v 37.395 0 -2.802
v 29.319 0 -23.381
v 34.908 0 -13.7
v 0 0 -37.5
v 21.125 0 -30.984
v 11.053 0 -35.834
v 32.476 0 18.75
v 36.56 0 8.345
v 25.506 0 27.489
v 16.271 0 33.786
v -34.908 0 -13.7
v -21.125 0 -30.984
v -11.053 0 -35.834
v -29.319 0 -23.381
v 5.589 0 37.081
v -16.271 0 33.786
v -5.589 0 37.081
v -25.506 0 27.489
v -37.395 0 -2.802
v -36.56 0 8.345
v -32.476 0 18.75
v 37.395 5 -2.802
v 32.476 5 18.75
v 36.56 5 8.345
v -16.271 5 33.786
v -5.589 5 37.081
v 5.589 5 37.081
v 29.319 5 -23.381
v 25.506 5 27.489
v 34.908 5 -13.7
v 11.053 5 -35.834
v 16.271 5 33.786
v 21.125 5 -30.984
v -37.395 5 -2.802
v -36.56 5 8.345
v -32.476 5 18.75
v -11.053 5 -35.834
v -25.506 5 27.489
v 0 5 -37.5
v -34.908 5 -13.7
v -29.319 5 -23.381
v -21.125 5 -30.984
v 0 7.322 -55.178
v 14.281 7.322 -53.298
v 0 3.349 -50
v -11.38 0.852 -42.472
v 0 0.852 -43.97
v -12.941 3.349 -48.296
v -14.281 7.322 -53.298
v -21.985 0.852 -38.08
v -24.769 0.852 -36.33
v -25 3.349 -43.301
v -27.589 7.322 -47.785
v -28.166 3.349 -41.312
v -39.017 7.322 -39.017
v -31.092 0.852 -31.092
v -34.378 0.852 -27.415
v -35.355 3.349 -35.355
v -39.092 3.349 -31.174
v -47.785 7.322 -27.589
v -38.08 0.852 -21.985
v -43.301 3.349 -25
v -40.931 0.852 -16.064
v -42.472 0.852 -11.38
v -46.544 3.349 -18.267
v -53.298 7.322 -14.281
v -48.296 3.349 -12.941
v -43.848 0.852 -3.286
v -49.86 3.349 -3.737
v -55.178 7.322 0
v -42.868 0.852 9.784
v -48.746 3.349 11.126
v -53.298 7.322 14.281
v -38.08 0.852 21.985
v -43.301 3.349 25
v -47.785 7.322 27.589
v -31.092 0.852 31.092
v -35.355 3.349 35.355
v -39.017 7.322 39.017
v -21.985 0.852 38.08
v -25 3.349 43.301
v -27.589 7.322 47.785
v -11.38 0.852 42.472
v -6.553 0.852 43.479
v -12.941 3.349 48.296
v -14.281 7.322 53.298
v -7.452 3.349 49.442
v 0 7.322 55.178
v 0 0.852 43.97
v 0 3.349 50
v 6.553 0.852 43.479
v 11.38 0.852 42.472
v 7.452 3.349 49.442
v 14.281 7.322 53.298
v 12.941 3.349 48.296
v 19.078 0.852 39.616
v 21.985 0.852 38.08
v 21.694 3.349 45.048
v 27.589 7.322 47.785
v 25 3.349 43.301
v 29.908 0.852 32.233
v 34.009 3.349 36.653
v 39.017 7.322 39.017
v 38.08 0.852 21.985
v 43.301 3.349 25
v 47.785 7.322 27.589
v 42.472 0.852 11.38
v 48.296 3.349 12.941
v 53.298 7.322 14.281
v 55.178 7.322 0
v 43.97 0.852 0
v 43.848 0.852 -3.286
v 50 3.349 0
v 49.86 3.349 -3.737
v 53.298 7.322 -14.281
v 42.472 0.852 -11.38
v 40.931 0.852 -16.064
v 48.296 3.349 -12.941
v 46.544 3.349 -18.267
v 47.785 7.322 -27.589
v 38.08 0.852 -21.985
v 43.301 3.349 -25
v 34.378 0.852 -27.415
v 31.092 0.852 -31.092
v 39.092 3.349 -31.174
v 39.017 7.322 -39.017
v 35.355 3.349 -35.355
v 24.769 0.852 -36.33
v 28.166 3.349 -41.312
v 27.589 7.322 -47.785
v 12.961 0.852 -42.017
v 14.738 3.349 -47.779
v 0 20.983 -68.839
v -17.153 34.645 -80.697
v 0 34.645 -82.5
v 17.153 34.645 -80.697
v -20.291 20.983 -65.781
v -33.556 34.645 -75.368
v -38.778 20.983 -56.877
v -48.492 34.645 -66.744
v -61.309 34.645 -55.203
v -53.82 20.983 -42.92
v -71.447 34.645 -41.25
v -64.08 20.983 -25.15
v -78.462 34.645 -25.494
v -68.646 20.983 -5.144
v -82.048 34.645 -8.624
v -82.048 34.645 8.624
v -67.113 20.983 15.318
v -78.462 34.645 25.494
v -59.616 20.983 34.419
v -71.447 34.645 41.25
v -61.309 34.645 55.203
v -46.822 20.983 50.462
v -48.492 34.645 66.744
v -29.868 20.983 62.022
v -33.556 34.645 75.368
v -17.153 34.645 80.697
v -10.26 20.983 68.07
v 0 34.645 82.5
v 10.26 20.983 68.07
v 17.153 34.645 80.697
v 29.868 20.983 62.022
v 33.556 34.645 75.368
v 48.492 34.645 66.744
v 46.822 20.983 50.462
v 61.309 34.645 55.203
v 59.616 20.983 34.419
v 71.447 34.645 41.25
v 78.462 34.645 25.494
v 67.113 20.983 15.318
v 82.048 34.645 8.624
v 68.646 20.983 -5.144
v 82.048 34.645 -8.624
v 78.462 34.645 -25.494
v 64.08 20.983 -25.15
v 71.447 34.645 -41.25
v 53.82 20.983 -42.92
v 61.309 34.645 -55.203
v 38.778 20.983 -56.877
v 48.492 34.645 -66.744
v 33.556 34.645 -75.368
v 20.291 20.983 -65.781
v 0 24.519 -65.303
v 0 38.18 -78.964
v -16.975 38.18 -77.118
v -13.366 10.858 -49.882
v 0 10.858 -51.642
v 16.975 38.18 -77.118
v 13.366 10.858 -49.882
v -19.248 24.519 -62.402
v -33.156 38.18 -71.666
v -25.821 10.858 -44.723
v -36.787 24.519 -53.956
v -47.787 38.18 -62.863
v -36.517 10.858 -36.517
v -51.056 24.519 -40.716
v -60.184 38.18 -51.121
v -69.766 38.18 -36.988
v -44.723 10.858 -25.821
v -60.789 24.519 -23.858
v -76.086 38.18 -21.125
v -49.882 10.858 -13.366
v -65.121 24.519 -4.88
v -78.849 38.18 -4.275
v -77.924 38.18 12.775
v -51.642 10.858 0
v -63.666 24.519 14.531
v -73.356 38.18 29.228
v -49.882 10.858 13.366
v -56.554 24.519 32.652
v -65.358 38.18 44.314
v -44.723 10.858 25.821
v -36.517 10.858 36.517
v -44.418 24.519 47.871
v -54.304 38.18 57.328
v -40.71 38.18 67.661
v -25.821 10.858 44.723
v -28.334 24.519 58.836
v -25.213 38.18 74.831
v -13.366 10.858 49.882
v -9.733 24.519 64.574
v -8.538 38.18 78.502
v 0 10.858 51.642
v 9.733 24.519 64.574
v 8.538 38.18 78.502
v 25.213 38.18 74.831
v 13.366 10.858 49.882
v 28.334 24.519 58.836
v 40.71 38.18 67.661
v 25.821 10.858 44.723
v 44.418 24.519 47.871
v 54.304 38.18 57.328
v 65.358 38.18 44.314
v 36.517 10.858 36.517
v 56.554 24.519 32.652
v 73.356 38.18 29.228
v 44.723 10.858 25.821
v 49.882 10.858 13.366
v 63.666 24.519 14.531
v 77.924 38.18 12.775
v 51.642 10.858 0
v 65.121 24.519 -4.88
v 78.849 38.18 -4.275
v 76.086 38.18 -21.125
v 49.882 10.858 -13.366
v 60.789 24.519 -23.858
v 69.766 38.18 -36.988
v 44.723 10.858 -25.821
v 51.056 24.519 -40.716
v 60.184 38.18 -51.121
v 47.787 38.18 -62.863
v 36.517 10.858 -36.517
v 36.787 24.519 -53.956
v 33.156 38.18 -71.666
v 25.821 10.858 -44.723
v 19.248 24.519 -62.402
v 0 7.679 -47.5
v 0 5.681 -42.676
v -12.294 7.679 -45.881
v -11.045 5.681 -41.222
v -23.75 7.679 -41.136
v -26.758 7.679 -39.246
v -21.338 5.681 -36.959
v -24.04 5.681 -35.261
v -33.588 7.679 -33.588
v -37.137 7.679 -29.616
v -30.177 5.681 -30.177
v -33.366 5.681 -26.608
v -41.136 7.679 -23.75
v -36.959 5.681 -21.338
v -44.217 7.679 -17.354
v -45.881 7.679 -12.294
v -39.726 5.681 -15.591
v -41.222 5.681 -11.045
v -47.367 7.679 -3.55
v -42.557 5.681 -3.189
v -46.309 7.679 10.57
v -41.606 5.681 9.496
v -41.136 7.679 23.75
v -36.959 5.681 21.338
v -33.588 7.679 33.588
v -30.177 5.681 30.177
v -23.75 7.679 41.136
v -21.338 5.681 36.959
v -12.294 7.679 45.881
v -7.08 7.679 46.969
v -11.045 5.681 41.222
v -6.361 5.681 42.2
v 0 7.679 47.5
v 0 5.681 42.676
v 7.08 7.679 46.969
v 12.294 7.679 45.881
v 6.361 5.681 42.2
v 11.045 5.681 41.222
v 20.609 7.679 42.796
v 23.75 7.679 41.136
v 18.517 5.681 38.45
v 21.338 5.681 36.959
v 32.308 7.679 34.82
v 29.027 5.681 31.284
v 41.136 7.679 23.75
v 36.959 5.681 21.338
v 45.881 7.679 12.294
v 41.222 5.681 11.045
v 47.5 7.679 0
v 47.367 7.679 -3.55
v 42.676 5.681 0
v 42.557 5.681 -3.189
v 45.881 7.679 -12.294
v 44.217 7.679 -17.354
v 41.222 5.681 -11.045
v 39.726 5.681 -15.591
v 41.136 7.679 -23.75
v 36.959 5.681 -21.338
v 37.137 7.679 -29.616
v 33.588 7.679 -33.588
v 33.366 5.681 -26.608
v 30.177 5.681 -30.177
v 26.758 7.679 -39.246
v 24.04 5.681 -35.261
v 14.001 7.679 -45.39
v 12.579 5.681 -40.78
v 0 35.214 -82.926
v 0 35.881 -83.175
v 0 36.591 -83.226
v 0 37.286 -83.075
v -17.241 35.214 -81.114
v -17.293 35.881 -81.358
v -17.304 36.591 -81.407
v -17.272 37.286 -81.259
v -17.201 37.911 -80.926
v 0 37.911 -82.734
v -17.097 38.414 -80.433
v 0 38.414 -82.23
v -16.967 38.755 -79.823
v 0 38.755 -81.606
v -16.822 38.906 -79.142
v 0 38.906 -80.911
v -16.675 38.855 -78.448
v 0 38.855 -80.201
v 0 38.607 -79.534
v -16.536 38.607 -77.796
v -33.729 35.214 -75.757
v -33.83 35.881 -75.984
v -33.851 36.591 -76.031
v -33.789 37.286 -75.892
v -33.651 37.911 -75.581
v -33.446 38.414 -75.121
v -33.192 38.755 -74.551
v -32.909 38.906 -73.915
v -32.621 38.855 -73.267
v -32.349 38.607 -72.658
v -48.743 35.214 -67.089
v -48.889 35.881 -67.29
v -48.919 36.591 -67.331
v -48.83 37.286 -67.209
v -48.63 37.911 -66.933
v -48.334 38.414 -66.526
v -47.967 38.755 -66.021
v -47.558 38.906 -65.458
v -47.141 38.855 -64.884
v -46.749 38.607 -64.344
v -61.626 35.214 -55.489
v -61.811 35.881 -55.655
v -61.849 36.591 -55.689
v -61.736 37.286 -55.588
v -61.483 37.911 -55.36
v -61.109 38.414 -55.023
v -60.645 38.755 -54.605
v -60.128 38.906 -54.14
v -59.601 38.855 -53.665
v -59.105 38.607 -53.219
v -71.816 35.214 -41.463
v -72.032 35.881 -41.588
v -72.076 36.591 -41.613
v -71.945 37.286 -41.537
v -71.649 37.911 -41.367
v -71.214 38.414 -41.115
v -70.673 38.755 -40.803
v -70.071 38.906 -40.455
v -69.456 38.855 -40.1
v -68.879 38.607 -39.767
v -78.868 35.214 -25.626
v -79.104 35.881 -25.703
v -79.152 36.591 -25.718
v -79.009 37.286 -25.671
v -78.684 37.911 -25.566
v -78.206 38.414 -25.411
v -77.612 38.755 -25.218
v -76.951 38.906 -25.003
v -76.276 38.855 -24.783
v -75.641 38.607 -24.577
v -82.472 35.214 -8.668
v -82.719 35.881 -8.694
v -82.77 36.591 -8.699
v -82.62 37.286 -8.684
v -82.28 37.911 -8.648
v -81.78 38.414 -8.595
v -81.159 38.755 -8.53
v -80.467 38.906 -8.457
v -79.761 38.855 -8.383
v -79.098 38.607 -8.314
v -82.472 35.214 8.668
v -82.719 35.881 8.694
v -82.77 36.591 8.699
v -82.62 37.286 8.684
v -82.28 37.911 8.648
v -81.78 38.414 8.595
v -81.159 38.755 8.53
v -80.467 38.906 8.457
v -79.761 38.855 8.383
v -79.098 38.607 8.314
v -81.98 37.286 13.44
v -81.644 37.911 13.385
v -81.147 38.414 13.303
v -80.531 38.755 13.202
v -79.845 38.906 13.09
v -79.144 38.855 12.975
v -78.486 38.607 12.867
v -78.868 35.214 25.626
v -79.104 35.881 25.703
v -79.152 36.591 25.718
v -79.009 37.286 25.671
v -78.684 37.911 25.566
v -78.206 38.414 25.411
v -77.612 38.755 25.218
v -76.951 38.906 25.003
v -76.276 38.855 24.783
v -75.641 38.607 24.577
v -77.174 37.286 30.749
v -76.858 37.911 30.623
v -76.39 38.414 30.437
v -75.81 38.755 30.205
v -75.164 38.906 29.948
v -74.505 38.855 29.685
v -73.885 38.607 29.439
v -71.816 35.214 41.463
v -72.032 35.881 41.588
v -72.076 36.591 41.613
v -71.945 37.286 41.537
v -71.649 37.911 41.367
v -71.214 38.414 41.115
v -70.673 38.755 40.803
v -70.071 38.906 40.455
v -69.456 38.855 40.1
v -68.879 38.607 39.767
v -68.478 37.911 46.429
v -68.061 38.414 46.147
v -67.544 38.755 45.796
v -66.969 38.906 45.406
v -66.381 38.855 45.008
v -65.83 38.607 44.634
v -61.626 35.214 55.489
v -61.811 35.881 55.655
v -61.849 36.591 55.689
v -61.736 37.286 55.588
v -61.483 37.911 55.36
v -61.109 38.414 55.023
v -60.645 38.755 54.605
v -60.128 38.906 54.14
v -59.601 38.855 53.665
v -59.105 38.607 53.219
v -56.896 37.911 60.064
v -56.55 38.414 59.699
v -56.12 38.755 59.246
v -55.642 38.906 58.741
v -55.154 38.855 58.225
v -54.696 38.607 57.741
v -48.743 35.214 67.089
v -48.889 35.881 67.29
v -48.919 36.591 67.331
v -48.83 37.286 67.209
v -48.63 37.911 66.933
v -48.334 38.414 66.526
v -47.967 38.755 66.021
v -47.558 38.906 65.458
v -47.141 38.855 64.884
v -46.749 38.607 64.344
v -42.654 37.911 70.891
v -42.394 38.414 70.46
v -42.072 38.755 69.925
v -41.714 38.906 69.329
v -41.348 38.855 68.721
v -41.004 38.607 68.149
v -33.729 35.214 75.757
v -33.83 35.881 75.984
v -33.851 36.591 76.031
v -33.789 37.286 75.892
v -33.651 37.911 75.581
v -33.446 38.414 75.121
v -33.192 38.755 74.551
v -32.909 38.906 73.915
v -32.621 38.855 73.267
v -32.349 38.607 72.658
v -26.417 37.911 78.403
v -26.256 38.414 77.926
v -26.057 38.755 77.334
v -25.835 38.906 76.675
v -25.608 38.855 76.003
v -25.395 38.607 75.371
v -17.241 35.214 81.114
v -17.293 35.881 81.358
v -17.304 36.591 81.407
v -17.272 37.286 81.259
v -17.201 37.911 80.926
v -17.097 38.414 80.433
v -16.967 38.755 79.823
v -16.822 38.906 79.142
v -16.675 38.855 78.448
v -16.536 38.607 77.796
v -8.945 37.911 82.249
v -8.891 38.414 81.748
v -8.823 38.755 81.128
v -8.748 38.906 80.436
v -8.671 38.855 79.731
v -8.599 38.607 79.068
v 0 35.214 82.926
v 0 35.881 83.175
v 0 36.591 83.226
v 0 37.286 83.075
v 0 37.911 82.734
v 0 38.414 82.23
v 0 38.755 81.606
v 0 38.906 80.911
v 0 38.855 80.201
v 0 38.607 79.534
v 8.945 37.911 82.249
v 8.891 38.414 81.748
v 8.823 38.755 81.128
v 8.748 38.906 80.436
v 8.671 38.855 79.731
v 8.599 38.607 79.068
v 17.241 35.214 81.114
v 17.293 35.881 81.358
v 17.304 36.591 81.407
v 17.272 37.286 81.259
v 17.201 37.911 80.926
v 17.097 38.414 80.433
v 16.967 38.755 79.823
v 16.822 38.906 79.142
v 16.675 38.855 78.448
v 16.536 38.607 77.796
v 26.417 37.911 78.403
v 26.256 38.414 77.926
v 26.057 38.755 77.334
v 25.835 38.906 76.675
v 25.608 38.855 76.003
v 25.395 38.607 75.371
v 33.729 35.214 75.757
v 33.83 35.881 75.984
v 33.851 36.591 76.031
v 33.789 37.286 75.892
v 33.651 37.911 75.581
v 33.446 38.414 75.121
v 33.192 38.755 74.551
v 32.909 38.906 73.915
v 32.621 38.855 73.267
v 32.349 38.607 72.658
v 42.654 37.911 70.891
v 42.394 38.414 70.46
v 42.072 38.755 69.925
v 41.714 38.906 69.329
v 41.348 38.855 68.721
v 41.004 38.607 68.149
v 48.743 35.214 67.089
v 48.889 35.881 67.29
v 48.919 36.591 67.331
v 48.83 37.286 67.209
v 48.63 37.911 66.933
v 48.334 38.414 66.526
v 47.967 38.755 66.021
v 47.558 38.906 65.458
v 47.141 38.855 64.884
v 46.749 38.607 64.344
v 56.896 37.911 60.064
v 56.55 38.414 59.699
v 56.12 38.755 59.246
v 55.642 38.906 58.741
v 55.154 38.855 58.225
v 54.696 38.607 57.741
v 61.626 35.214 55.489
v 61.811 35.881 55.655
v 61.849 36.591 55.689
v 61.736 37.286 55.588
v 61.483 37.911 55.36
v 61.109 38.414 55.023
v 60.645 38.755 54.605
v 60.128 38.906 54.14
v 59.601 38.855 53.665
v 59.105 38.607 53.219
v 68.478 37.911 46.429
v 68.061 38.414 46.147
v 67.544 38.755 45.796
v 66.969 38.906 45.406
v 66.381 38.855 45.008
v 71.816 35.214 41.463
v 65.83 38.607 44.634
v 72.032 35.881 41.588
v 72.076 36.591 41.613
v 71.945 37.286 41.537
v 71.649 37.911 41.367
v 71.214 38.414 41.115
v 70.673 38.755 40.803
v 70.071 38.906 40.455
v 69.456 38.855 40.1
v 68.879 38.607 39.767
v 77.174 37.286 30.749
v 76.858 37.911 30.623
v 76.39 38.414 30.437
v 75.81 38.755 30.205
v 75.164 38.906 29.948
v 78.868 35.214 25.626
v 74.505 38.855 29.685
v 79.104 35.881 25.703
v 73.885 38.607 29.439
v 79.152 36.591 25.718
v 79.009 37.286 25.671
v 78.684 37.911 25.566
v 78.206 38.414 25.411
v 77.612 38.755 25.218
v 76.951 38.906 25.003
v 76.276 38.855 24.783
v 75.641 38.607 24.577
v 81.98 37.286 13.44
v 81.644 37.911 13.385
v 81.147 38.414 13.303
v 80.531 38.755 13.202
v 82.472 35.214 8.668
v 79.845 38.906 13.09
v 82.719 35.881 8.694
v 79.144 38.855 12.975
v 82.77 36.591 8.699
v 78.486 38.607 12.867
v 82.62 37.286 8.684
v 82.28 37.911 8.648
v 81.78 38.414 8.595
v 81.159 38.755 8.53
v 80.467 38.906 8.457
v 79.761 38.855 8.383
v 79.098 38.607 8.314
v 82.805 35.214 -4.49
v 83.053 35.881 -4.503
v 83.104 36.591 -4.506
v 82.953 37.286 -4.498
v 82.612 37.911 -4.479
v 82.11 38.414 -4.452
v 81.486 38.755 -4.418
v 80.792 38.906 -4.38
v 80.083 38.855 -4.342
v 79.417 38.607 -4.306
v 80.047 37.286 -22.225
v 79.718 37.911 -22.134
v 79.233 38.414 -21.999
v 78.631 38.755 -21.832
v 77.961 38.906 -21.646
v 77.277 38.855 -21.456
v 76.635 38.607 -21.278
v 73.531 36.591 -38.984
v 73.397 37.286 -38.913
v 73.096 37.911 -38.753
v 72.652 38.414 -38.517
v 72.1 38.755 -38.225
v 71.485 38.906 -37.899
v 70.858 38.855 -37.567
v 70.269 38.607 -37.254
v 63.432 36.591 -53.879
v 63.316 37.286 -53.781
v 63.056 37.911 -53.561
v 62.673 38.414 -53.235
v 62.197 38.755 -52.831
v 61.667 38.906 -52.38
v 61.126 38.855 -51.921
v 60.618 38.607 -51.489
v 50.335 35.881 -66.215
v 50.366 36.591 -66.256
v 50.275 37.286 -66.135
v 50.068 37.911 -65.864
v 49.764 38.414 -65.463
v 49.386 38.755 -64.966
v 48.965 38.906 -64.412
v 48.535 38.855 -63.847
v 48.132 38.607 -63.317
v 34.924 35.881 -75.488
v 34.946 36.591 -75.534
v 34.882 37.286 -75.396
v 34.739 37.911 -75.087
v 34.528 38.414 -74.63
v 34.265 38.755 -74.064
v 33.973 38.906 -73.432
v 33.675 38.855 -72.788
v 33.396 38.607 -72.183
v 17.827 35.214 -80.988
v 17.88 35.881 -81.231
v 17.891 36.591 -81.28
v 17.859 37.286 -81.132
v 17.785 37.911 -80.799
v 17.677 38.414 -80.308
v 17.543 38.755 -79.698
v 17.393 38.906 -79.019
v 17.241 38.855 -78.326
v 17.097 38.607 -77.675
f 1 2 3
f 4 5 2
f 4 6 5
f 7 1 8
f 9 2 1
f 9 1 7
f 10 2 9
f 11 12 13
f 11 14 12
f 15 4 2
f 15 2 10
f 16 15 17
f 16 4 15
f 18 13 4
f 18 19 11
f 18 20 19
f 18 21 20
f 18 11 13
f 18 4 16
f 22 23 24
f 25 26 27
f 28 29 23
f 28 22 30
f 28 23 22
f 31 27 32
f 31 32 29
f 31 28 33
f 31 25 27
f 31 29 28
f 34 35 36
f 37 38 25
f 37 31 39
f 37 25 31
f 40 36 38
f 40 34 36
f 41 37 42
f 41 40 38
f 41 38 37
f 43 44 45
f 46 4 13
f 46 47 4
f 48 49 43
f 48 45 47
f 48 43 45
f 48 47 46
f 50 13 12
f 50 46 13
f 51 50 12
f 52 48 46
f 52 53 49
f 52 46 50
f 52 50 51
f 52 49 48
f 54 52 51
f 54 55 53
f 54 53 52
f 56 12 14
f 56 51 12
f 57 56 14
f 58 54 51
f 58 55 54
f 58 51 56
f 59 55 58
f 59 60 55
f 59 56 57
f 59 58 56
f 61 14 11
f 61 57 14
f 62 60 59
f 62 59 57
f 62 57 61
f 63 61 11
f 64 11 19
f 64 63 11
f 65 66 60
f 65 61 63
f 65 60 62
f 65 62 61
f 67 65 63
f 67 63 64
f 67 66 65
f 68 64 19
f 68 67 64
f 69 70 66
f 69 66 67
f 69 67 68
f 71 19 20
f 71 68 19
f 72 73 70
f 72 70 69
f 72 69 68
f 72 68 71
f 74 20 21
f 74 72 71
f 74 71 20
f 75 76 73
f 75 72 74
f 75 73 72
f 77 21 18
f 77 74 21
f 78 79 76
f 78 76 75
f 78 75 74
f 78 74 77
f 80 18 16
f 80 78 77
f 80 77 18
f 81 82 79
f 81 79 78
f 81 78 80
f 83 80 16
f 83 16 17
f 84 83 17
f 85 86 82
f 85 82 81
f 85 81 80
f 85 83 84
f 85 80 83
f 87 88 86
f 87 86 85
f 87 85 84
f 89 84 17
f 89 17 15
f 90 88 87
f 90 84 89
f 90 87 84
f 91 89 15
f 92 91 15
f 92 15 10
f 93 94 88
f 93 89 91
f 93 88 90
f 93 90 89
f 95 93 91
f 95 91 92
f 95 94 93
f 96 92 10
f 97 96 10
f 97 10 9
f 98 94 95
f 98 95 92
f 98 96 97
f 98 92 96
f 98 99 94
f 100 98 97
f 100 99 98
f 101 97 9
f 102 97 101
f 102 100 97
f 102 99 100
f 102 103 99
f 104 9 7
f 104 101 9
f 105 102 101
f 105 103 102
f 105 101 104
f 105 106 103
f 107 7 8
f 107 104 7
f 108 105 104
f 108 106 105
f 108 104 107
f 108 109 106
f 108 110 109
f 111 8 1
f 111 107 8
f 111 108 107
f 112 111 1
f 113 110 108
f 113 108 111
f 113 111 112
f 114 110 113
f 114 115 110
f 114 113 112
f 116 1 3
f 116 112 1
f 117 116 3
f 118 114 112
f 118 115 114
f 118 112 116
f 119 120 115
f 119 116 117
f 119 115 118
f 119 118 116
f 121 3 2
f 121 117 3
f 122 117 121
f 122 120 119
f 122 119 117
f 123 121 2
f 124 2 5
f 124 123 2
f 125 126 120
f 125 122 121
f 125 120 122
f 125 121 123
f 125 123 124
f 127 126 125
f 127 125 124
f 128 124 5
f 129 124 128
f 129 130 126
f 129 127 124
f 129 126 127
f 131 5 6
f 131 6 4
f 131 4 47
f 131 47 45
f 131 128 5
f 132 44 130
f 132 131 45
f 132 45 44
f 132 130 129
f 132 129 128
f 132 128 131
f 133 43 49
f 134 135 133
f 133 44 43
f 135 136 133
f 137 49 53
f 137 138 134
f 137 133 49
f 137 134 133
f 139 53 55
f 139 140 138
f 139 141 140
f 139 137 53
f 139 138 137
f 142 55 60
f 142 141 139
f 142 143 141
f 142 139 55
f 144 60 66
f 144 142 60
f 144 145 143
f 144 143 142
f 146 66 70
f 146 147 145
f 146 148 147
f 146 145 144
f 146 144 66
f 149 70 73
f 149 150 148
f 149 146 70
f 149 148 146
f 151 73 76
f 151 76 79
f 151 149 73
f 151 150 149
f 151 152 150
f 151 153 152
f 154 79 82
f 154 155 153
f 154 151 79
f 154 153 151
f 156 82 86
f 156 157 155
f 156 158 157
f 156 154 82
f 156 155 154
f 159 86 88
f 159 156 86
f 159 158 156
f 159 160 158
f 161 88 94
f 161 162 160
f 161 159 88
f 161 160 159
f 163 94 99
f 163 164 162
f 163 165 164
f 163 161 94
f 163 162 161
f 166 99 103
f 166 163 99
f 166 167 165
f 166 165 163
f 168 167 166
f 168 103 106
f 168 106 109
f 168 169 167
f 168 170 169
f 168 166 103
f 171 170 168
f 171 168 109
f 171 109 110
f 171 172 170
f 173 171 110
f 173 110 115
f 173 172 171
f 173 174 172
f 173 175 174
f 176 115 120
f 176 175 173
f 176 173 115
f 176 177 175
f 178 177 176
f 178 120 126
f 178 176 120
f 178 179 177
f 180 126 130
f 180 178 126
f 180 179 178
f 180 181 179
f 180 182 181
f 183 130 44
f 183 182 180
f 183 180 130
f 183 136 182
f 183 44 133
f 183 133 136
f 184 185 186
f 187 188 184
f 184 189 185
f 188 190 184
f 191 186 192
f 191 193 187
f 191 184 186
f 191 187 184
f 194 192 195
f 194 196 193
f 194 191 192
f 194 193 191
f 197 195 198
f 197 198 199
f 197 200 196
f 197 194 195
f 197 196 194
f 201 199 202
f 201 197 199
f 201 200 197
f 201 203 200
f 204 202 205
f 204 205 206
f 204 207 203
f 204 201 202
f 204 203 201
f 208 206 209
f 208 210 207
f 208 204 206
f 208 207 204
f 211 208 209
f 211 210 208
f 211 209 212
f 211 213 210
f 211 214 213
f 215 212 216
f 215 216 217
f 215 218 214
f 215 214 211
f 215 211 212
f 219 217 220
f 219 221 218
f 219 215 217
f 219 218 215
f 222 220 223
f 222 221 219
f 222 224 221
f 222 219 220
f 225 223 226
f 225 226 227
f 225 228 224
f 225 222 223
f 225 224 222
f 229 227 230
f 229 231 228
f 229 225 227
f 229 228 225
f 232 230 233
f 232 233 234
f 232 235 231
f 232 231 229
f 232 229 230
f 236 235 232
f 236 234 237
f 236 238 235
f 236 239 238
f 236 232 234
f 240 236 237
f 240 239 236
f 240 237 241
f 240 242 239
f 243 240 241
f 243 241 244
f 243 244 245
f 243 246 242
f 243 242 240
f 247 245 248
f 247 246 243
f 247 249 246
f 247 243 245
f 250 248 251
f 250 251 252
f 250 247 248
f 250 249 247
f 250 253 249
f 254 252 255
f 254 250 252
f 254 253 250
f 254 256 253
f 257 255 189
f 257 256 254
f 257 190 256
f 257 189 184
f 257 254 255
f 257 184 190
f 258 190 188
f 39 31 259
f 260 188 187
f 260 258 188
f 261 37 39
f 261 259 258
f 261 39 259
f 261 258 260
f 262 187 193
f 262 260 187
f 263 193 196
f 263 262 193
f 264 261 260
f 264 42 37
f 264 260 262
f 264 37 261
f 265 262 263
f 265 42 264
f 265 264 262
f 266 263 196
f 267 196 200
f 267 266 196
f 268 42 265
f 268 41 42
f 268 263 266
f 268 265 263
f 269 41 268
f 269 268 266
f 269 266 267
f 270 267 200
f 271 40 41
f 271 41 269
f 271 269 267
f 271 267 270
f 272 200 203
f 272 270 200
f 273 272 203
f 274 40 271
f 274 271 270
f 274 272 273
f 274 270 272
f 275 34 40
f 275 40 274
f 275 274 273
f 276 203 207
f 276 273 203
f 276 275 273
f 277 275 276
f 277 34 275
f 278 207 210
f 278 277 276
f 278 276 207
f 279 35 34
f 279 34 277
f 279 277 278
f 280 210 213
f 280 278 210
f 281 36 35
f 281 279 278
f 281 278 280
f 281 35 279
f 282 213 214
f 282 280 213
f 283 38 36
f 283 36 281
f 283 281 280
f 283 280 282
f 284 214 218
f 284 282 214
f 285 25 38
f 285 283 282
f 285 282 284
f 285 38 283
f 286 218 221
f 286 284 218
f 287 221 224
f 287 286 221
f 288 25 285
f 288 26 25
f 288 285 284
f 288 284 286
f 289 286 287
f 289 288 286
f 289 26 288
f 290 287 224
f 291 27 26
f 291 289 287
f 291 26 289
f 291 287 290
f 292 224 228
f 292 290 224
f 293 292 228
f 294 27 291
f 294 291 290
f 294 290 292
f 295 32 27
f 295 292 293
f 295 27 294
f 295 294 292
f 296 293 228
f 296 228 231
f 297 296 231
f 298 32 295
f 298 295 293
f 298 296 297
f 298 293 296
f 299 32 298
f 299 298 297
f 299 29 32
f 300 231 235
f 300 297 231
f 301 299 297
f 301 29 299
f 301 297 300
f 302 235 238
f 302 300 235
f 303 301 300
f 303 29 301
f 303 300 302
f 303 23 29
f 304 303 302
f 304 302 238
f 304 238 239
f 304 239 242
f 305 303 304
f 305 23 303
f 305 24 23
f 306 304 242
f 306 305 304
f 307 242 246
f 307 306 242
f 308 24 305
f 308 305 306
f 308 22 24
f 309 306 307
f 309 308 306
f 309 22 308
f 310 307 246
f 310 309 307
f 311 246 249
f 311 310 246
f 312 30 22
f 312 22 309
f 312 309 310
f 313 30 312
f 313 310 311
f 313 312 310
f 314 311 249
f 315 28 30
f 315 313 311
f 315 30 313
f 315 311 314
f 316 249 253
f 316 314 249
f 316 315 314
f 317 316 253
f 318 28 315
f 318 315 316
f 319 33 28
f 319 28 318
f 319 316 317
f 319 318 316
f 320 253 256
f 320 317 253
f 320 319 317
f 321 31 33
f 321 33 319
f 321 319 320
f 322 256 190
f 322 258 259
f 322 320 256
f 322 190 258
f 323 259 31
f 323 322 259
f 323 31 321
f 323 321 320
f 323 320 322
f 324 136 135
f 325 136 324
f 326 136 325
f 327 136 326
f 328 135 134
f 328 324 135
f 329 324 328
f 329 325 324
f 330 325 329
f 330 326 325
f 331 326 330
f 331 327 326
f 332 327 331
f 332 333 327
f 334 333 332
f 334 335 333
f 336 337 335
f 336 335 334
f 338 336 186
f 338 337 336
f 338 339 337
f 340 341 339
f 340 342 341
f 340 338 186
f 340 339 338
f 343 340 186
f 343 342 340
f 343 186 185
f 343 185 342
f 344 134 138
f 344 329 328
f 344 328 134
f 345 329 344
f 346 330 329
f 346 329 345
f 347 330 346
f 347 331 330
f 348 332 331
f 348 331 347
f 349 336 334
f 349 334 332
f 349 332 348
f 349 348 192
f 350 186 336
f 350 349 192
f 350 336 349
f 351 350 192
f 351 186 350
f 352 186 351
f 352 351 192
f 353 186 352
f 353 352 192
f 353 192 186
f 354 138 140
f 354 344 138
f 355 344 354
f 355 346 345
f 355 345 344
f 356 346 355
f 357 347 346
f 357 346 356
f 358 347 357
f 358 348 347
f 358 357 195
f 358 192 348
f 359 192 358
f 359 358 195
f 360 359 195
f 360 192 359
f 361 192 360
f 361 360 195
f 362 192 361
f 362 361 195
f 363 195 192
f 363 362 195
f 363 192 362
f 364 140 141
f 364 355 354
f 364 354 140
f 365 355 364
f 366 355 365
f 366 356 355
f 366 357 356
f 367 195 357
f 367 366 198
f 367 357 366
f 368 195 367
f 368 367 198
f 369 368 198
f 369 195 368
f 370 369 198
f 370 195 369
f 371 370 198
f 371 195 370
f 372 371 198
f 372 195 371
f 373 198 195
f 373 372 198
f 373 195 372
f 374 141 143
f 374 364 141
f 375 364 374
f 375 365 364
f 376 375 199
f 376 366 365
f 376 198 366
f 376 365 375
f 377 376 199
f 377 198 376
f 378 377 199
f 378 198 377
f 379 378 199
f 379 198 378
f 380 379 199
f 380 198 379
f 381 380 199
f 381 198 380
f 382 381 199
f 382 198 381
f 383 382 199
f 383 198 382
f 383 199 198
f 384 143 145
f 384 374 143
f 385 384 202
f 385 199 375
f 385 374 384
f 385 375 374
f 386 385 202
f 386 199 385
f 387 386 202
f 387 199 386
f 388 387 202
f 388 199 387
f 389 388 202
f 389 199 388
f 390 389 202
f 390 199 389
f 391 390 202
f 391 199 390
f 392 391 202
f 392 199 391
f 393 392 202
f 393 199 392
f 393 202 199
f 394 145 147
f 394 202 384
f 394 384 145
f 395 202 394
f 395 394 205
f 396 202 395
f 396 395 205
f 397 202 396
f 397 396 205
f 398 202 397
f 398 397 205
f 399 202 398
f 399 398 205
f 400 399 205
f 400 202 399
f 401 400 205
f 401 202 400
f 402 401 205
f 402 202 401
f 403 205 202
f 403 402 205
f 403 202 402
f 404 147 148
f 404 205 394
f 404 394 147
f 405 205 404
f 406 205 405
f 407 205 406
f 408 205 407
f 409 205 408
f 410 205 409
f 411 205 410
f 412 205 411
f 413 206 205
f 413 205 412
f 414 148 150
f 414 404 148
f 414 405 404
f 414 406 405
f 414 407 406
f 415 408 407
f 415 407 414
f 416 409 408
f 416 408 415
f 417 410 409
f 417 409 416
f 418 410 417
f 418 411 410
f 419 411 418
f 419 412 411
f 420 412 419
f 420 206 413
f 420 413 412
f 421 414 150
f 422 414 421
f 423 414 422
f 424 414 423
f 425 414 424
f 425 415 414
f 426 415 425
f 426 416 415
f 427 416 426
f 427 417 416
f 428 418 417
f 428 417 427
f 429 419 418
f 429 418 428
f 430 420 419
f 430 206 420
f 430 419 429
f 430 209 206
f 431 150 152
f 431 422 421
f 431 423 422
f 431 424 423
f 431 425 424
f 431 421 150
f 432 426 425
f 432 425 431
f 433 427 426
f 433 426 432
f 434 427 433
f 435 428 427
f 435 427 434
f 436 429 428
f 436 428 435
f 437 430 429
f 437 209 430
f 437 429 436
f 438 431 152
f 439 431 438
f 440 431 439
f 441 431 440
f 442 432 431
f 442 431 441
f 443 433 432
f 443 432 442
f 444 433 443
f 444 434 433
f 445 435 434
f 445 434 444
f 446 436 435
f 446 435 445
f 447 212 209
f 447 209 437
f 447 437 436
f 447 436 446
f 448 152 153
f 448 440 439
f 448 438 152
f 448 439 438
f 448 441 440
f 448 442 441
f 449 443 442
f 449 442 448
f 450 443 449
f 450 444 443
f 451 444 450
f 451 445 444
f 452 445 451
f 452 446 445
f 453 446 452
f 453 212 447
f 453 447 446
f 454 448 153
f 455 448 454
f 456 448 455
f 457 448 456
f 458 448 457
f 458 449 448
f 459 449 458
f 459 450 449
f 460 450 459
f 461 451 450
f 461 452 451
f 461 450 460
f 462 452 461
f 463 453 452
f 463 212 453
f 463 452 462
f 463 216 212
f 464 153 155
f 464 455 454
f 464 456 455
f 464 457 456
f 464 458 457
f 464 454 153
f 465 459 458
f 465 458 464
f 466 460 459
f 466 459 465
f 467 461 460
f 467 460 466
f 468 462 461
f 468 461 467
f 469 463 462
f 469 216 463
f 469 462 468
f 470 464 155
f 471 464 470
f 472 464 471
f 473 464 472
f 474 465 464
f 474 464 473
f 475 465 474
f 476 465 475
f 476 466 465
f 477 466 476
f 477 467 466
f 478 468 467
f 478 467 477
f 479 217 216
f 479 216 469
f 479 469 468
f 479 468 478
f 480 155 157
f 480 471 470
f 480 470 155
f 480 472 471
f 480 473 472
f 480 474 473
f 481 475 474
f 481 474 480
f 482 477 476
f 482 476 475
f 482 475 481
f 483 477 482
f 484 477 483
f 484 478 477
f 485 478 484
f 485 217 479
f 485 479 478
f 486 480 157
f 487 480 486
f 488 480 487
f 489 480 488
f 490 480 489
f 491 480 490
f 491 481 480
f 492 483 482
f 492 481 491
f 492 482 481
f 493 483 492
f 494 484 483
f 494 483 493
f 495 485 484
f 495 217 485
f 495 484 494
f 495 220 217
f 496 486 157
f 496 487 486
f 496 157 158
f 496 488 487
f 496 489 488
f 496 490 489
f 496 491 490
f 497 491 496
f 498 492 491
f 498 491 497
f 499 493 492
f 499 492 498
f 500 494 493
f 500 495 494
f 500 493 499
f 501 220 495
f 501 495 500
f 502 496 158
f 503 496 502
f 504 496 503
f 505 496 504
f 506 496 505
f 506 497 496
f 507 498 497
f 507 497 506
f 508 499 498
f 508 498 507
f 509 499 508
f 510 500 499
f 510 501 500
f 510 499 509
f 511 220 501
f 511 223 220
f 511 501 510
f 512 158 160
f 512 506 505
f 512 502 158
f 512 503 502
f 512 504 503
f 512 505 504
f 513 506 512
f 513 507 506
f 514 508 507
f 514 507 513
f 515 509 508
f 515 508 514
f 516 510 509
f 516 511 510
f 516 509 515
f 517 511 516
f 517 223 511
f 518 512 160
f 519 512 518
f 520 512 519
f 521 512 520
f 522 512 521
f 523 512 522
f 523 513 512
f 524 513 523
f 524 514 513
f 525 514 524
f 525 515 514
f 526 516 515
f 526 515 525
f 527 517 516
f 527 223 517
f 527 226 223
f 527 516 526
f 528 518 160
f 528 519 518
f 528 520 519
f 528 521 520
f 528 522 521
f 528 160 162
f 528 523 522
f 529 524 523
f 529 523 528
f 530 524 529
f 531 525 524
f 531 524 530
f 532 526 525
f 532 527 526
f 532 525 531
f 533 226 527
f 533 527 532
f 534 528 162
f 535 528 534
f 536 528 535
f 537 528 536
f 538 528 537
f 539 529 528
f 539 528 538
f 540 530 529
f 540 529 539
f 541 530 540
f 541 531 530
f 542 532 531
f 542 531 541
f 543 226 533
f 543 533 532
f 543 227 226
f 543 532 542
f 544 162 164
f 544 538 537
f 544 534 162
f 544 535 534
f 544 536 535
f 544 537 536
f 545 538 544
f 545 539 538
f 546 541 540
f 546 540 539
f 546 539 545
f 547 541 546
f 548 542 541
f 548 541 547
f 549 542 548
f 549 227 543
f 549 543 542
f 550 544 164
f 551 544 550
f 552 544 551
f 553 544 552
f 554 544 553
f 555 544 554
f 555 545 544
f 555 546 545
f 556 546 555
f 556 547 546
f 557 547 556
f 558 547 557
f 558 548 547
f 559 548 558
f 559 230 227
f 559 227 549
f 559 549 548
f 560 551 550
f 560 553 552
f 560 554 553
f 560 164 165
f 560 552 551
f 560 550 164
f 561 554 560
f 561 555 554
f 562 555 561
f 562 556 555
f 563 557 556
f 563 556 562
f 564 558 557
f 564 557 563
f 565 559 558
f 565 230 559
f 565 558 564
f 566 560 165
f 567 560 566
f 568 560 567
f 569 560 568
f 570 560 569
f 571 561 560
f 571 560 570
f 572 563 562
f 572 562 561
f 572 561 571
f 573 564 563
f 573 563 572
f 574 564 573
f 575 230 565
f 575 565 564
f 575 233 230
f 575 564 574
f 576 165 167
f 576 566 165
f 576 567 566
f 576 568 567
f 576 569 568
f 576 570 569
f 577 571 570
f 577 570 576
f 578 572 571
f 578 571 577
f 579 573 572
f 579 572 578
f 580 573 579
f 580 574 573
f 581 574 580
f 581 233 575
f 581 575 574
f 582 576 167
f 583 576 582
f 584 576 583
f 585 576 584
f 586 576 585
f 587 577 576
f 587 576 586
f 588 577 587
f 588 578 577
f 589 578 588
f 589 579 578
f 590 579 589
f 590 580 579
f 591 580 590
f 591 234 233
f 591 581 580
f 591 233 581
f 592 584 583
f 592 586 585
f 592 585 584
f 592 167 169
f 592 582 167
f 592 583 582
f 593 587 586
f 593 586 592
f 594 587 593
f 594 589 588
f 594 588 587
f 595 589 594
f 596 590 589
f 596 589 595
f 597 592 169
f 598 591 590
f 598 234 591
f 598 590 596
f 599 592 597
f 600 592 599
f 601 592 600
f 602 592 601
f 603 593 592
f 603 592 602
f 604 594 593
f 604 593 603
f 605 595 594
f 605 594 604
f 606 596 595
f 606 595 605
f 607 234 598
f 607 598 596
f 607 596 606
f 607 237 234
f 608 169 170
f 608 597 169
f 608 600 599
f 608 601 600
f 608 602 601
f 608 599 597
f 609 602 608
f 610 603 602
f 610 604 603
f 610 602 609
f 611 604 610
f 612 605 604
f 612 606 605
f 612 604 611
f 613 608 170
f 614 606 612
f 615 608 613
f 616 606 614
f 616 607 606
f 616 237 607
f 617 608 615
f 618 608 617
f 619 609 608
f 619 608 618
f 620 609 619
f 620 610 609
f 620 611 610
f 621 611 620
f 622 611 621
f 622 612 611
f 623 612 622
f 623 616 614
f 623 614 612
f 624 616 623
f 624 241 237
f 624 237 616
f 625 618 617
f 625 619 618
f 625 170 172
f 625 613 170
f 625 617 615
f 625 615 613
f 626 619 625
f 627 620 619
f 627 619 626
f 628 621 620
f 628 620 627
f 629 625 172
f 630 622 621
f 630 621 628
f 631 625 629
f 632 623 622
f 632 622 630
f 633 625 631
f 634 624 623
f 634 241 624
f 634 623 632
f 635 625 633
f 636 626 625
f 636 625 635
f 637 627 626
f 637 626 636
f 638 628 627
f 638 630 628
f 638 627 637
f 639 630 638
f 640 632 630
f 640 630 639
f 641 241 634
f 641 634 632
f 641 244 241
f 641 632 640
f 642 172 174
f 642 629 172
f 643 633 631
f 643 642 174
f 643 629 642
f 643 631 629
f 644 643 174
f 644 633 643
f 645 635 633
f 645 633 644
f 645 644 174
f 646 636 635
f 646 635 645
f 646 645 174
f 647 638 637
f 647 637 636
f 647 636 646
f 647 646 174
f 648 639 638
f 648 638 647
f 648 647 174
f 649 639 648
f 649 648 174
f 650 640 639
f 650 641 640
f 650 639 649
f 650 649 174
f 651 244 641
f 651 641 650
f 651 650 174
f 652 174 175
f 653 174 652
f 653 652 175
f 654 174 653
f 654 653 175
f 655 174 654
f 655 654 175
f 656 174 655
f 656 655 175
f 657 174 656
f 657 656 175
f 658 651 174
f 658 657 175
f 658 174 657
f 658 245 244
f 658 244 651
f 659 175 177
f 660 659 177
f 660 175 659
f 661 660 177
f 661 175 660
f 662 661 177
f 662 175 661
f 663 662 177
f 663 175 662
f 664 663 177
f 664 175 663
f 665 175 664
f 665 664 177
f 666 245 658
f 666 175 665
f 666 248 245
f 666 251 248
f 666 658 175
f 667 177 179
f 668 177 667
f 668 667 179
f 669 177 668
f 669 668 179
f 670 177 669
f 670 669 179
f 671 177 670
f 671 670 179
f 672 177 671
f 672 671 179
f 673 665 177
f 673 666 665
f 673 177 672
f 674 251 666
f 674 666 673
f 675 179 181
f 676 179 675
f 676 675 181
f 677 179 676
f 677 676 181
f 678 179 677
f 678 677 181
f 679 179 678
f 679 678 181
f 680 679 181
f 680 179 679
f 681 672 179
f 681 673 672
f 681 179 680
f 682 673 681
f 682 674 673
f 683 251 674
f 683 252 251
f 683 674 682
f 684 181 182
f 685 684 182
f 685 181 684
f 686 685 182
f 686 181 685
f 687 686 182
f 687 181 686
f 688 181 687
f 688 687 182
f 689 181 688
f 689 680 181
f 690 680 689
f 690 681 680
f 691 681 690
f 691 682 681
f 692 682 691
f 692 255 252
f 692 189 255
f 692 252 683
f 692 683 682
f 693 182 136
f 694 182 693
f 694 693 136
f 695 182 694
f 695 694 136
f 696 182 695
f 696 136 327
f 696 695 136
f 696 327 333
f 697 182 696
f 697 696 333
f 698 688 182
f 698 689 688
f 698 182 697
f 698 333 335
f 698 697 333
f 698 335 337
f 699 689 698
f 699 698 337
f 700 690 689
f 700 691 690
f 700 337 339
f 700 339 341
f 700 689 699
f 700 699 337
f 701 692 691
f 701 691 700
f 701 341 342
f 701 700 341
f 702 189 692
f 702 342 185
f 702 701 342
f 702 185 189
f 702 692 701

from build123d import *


with BuildPart() as part:
    # Sketch1 → Revolve1 (revolve)
    with BuildSketch(Plane.XY, mode=Mode.PRIVATE) as revolve1_sk:
        with BuildLine():
            Line((0, 0), (37.5, 0))
            ThreePointArc((37.5, 0), (47.067085809, 1.903011687), (55.17766953, 7.32233047))
            Line((55.17766953, 7.32233047), (82.5, 34.644660941))
            ThreePointArc((82.5, 34.644660941), (82.5, 38.180194847), (78.964466094, 38.180194847))
            Line((78.964466094, 38.180194847), (51.642135624, 10.857864376))
            ThreePointArc((51.642135624, 10.857864376), (45.153668647, 6.52240935), (37.5, 5))
            Line((37.5, 5), (0, 5))
            Line((0, 5), (0, 0))
        make_face()
    revolve(revolve1_sk.sketch.rotate(Axis((0, 0, 0), (0, 1, 0)), 90), axis=Axis((0, 0, 0), (0, 1, 0)))


solid = part.part
